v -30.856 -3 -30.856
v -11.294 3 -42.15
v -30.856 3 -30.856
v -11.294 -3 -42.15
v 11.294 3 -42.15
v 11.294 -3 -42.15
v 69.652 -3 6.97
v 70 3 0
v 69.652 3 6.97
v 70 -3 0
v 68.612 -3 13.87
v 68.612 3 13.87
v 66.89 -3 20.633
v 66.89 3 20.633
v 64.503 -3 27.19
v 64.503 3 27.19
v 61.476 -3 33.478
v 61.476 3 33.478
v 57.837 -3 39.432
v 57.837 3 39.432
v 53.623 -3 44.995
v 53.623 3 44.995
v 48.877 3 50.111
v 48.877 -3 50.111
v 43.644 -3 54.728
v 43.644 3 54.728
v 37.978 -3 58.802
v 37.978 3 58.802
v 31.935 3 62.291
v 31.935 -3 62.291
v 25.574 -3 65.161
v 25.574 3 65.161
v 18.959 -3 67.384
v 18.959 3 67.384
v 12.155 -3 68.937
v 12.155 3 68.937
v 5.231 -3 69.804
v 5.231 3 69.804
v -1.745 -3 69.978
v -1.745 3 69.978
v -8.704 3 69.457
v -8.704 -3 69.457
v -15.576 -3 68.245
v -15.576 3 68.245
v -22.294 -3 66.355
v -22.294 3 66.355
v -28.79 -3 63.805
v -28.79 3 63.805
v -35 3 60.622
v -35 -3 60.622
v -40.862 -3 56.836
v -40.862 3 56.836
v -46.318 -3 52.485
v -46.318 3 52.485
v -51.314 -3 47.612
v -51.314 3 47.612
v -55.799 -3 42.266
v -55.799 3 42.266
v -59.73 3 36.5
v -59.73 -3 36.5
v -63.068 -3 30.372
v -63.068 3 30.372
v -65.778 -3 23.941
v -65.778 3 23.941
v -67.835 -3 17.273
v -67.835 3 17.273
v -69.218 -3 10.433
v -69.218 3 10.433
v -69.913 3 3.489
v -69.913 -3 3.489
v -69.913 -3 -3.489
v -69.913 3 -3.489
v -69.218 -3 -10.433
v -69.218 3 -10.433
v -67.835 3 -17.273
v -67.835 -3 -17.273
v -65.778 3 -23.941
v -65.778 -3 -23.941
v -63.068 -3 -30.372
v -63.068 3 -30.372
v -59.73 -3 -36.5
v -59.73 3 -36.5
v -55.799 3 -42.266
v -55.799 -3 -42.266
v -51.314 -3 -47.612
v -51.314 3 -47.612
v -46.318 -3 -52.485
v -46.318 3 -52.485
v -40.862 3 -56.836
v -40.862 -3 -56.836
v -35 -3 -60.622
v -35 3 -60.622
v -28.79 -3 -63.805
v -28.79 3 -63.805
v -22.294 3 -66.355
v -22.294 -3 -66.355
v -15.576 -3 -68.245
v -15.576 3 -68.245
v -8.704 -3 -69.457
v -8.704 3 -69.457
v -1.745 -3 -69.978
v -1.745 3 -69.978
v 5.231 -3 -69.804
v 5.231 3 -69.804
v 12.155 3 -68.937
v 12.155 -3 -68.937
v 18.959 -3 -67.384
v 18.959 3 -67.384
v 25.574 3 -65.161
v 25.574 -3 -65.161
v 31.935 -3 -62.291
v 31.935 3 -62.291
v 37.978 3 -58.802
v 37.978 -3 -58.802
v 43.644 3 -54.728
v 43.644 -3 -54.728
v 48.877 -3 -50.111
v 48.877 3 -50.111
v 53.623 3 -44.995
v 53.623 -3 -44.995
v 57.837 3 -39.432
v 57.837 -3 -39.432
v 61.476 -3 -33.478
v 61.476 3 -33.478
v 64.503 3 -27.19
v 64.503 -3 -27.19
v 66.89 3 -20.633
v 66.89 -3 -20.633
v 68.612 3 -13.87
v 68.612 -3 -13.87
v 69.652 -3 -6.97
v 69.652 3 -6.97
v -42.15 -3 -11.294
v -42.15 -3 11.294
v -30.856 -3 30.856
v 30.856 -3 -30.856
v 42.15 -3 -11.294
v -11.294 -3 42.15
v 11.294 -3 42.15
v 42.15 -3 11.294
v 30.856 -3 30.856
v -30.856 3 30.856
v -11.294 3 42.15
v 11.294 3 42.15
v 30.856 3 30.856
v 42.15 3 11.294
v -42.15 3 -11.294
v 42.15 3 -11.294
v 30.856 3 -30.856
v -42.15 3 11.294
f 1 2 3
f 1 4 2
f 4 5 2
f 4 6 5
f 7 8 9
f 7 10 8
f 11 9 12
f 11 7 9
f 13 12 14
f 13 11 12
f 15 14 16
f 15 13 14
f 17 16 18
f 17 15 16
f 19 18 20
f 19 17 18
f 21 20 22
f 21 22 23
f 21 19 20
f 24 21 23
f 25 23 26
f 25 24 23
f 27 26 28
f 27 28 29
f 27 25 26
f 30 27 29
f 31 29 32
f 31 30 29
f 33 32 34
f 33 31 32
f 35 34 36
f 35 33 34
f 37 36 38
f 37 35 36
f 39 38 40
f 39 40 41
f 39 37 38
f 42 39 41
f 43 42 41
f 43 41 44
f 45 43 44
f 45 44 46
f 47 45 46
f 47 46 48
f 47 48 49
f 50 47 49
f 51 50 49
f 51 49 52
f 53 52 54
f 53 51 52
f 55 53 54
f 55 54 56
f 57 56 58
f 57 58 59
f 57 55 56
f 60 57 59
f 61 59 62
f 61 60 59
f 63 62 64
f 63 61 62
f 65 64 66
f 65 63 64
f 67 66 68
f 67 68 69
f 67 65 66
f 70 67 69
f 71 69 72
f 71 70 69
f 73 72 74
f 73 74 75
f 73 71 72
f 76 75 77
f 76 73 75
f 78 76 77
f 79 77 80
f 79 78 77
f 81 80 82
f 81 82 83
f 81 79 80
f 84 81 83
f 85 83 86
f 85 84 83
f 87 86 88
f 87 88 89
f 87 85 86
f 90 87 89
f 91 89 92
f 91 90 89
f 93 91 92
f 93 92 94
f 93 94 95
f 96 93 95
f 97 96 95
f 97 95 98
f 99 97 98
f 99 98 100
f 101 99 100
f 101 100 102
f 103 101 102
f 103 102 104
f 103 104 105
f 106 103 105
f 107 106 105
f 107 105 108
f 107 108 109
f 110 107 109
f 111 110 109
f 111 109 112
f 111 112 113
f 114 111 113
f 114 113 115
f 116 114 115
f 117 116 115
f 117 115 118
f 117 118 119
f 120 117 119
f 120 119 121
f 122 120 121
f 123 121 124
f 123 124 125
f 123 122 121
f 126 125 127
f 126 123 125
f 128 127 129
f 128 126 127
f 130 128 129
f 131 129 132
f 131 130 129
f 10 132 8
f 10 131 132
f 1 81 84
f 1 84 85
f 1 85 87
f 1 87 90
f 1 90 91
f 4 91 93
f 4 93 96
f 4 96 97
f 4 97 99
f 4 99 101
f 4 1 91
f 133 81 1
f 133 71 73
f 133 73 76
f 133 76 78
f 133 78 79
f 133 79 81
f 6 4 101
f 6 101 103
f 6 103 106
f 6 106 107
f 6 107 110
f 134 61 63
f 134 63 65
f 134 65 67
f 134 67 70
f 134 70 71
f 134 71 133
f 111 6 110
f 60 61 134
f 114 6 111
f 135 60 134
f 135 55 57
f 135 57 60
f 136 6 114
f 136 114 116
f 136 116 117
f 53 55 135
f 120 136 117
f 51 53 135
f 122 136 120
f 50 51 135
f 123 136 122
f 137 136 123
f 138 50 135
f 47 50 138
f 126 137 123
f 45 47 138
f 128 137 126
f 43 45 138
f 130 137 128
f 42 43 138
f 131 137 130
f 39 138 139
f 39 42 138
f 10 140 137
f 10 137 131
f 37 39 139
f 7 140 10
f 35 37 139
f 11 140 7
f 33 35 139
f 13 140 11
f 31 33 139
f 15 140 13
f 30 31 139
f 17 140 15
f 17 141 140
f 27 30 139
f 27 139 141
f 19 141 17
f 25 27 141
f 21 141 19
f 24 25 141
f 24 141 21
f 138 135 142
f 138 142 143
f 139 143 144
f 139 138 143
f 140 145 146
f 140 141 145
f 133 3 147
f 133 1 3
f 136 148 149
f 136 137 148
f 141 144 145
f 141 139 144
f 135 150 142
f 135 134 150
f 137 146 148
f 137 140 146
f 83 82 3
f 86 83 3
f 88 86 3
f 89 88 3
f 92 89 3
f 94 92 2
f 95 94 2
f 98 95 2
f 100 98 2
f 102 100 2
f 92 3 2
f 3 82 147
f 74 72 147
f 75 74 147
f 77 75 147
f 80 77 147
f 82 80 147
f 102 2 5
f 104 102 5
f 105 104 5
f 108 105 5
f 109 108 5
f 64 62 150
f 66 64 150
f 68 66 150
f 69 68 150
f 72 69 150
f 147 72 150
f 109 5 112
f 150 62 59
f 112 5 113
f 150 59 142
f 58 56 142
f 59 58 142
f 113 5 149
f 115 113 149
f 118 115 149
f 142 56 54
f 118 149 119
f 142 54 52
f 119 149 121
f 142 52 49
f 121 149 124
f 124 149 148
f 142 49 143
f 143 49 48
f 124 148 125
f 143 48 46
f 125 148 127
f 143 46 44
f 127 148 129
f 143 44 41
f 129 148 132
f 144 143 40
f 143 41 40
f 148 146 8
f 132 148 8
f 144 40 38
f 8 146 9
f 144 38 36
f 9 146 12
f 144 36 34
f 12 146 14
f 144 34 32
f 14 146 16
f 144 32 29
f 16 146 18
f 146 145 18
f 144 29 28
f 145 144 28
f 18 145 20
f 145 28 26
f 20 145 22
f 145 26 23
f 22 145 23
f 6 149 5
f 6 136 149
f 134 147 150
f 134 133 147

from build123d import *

# Parameters (mm, degrees)
F0_R     = 70
F1_DEPTH = 3


# Not quite as in the source:
# - a feature of the source that left no trace in its solid (it failed there, or was rolled back) is left out


with BuildPart() as f1:
    # F0 (on Front) → F1 (new body, symmetric)
    with BuildSketch(Plane.XZ):
        Circle(F0_R)
        Polygon((-30.855941539, 30.855941539), (-11.294058461, 42.15), (11.294058461, 42.15), (30.855941539, 30.855941539), (42.15, 11.294058461), (42.15, -11.294058461), (30.855941539, -30.855941539), (11.294058461, -42.15), (-11.294058461, -42.15), (-30.855941539, -30.855941539), (-42.15, -11.294058461), (-42.15, 11.294058461), align=None, mode=Mode.SUBTRACT)
    extrude(amount=F1_DEPTH, both=True)


solid = f1.part
